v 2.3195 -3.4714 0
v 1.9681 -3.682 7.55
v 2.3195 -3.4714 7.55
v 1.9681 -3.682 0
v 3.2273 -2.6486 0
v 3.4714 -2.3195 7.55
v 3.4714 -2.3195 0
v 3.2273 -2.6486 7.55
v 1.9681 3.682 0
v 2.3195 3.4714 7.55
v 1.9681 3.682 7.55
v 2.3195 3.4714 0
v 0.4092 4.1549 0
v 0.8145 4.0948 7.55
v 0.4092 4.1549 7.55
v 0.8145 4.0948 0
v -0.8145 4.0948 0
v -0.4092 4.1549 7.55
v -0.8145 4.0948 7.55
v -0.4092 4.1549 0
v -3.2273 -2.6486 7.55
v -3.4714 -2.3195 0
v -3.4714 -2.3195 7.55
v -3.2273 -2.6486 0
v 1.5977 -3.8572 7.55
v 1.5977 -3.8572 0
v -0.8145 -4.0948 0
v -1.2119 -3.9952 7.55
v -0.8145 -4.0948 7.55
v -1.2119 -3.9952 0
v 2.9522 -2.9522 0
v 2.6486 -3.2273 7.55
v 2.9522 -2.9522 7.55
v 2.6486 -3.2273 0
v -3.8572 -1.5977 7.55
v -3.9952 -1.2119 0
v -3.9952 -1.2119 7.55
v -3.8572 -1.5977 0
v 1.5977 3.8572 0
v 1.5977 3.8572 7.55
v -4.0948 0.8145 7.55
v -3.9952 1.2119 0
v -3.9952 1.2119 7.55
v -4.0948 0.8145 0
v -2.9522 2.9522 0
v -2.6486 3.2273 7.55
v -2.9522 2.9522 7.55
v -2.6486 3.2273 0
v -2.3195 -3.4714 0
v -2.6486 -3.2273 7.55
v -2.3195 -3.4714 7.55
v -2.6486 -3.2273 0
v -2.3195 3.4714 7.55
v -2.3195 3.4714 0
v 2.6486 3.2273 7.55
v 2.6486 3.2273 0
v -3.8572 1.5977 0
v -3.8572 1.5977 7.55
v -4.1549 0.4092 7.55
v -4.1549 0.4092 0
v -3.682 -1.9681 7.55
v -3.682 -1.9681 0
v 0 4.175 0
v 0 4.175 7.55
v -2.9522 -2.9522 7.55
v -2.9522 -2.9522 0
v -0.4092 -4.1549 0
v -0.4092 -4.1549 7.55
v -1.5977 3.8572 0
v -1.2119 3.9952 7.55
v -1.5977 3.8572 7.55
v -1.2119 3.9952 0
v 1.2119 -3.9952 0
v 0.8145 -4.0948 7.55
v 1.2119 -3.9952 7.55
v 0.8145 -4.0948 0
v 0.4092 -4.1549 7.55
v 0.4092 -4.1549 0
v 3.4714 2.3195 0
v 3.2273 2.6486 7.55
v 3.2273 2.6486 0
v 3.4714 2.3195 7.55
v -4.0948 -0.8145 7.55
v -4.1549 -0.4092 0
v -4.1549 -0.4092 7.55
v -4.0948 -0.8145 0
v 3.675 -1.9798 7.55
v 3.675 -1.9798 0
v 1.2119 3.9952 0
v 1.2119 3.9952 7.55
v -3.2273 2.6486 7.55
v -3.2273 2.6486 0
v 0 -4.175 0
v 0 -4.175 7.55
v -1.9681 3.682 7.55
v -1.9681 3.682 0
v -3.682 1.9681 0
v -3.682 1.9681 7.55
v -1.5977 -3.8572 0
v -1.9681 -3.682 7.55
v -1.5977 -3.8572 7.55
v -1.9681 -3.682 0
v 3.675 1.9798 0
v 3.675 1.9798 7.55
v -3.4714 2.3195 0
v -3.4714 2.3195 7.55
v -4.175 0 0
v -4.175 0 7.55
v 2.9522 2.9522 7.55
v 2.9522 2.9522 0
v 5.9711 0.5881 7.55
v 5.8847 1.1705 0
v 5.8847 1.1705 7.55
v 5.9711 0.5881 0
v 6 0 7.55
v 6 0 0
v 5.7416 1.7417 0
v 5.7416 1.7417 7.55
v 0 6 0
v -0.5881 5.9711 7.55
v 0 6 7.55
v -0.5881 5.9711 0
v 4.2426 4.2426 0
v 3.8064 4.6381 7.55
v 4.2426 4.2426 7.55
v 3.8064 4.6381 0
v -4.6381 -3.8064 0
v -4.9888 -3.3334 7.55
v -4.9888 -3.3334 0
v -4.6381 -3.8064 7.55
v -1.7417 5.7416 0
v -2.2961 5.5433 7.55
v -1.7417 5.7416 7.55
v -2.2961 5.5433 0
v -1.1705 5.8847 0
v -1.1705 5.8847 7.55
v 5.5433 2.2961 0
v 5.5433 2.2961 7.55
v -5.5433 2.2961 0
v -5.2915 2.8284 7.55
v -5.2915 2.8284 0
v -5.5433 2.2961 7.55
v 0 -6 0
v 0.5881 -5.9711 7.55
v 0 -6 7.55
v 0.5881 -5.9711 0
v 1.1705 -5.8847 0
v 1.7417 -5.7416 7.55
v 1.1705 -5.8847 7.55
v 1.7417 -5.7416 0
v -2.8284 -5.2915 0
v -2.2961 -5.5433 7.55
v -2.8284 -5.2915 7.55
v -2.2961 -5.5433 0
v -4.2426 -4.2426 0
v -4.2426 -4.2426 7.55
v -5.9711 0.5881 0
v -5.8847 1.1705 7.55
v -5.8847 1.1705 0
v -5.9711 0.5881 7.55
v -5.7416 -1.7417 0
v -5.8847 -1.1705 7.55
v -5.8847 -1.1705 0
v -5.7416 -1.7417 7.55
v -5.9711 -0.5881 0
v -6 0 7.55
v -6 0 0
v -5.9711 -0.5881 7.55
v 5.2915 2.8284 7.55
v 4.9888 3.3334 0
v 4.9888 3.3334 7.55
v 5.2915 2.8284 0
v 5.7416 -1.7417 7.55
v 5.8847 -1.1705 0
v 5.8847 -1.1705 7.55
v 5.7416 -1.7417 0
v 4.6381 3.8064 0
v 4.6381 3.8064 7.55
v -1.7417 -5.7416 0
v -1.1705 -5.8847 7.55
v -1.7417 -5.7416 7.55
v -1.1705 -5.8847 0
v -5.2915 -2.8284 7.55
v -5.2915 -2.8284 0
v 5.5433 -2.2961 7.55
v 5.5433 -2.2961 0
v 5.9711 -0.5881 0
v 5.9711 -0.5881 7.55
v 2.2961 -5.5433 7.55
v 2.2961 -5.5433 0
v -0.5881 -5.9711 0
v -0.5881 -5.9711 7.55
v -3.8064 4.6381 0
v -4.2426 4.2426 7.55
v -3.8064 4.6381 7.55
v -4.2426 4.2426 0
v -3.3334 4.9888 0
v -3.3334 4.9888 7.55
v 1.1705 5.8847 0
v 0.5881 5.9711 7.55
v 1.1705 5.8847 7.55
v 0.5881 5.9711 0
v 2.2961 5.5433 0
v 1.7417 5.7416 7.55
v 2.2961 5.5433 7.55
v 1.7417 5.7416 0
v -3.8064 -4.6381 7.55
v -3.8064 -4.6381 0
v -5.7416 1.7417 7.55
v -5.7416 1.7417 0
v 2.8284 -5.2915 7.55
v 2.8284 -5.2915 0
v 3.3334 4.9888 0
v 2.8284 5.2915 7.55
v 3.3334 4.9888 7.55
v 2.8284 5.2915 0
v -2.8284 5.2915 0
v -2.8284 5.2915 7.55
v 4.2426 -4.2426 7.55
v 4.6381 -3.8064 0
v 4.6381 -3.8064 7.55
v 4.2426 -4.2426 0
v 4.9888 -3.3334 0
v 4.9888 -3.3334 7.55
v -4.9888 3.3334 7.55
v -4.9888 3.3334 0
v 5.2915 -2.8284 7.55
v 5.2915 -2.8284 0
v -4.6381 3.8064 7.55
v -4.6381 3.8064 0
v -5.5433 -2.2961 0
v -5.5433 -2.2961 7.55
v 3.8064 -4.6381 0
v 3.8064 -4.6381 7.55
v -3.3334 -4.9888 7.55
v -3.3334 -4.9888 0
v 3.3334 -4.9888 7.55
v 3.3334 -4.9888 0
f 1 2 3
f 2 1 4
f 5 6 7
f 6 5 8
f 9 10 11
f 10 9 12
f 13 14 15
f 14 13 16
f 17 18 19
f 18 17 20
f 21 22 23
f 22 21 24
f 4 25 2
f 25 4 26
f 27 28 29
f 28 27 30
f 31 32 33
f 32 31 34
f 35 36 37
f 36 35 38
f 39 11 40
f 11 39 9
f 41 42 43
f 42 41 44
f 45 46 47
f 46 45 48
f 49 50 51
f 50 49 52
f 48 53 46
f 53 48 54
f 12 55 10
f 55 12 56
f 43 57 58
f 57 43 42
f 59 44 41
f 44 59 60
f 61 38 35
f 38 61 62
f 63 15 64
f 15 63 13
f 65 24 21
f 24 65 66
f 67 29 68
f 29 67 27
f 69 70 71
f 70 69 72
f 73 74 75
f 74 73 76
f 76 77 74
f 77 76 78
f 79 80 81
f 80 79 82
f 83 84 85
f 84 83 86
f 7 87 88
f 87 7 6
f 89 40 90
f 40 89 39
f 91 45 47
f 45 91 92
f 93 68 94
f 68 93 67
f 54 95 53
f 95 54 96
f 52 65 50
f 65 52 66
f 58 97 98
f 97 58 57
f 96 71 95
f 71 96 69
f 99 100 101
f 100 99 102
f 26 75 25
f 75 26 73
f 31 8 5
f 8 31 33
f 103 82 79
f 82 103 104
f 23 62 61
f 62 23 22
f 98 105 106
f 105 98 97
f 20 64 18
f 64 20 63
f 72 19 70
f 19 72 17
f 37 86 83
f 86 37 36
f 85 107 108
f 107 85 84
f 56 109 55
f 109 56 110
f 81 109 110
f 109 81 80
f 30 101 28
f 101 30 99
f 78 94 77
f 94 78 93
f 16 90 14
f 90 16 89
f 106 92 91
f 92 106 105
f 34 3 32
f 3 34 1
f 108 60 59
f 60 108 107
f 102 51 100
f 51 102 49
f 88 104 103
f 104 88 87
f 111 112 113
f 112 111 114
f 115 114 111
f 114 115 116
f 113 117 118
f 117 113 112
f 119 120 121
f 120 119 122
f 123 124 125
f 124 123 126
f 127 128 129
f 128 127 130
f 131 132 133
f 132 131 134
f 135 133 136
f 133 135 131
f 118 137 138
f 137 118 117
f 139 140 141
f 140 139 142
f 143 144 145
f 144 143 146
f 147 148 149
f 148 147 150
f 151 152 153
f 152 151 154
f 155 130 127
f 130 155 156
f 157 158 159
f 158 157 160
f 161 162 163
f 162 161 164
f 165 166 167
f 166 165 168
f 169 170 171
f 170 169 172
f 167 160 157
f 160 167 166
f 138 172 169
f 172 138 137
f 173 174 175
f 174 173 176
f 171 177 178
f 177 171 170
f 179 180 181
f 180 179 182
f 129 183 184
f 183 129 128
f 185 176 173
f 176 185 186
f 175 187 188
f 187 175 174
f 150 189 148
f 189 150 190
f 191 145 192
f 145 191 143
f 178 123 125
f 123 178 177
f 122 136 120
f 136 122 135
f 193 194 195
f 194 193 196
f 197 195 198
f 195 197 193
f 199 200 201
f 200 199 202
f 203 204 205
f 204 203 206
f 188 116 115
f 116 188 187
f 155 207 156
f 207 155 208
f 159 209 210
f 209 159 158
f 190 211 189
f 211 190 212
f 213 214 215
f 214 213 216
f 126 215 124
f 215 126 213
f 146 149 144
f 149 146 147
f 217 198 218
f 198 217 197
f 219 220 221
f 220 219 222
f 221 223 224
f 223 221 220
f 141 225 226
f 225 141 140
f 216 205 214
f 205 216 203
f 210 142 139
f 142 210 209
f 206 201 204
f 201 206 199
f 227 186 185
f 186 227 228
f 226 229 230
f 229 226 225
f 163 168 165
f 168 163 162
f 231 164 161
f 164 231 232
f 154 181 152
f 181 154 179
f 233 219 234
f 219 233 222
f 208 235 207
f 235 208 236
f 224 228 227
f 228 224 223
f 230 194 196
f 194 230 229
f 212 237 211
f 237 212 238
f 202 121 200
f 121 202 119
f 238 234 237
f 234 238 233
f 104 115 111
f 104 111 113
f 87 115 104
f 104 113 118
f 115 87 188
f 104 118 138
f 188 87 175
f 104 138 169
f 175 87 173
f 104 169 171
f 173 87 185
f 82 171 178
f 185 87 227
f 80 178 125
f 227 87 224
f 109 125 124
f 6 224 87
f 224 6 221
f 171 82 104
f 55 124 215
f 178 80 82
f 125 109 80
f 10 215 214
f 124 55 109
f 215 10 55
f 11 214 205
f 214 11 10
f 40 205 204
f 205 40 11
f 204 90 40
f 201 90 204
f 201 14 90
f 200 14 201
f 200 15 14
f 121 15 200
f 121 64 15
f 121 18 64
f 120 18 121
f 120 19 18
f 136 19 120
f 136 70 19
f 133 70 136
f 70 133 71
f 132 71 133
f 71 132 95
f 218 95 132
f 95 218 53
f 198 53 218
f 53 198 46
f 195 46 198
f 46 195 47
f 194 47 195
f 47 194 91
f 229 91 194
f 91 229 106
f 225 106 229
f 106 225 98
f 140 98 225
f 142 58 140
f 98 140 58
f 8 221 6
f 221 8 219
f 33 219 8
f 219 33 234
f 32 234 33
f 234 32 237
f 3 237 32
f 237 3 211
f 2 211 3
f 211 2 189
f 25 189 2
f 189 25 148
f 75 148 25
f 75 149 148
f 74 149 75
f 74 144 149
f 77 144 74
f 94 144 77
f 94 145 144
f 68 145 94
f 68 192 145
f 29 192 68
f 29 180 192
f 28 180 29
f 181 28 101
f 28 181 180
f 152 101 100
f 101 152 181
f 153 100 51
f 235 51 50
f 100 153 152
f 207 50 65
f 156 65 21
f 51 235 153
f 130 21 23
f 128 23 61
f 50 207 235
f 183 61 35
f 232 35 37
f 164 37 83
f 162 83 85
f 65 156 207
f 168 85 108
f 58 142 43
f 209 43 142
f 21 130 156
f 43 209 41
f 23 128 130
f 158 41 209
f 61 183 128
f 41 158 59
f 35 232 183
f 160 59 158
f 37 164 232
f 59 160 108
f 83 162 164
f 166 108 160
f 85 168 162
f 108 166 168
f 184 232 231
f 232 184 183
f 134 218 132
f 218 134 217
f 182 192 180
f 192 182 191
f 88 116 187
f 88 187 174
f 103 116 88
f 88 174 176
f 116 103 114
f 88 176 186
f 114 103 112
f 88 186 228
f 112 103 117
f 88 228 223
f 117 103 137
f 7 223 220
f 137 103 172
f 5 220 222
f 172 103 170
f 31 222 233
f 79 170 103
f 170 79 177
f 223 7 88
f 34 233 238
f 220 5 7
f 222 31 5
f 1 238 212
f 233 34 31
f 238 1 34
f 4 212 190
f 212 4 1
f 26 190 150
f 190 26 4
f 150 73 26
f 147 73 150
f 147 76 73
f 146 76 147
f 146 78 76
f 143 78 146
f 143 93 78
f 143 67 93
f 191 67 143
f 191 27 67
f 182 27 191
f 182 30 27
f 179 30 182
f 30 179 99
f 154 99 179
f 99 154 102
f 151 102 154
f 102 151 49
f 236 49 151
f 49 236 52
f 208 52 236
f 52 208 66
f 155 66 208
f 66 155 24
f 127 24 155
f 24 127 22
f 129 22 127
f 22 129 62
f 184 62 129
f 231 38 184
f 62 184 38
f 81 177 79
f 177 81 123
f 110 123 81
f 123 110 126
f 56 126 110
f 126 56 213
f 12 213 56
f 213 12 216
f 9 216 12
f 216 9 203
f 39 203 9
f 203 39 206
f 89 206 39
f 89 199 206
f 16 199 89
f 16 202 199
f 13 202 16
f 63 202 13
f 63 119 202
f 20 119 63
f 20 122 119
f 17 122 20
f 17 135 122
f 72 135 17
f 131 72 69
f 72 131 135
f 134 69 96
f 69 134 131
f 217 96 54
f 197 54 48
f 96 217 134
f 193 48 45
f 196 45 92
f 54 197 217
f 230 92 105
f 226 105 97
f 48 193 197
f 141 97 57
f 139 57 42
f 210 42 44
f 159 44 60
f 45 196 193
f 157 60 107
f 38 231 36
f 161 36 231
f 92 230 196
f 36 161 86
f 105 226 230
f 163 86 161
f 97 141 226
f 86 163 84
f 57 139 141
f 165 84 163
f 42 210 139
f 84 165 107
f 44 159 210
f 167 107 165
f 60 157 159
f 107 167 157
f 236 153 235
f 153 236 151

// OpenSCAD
// Gen-CK — gap sleeve: rigid spacer on the shaft BETWEEN the two rotor carriers (passes through the stator
// hole). Length = m2m, so it sets the magnet gap and carries the full magnet pull. Print x1, upright.
include <parameters.scad>;
$fn = 64;
// D-flat keyed bore: flat faces +X (angle 0 = magnet pocket 0 = index notch)
module dflat_bore(h) {
    intersection() {
        cylinder(d=shaft_bore, h=h);
        translate([-shaft_bore, -shaft_bore, 0]) cube([shaft_bore + dflat_x, 2*shaft_bore, h]);
    }
}

difference() {
    cylinder(d=sleeve_od, h=m2m);
    translate([0, 0, -0.1]) dflat_bore(m2m + 0.2);
}
